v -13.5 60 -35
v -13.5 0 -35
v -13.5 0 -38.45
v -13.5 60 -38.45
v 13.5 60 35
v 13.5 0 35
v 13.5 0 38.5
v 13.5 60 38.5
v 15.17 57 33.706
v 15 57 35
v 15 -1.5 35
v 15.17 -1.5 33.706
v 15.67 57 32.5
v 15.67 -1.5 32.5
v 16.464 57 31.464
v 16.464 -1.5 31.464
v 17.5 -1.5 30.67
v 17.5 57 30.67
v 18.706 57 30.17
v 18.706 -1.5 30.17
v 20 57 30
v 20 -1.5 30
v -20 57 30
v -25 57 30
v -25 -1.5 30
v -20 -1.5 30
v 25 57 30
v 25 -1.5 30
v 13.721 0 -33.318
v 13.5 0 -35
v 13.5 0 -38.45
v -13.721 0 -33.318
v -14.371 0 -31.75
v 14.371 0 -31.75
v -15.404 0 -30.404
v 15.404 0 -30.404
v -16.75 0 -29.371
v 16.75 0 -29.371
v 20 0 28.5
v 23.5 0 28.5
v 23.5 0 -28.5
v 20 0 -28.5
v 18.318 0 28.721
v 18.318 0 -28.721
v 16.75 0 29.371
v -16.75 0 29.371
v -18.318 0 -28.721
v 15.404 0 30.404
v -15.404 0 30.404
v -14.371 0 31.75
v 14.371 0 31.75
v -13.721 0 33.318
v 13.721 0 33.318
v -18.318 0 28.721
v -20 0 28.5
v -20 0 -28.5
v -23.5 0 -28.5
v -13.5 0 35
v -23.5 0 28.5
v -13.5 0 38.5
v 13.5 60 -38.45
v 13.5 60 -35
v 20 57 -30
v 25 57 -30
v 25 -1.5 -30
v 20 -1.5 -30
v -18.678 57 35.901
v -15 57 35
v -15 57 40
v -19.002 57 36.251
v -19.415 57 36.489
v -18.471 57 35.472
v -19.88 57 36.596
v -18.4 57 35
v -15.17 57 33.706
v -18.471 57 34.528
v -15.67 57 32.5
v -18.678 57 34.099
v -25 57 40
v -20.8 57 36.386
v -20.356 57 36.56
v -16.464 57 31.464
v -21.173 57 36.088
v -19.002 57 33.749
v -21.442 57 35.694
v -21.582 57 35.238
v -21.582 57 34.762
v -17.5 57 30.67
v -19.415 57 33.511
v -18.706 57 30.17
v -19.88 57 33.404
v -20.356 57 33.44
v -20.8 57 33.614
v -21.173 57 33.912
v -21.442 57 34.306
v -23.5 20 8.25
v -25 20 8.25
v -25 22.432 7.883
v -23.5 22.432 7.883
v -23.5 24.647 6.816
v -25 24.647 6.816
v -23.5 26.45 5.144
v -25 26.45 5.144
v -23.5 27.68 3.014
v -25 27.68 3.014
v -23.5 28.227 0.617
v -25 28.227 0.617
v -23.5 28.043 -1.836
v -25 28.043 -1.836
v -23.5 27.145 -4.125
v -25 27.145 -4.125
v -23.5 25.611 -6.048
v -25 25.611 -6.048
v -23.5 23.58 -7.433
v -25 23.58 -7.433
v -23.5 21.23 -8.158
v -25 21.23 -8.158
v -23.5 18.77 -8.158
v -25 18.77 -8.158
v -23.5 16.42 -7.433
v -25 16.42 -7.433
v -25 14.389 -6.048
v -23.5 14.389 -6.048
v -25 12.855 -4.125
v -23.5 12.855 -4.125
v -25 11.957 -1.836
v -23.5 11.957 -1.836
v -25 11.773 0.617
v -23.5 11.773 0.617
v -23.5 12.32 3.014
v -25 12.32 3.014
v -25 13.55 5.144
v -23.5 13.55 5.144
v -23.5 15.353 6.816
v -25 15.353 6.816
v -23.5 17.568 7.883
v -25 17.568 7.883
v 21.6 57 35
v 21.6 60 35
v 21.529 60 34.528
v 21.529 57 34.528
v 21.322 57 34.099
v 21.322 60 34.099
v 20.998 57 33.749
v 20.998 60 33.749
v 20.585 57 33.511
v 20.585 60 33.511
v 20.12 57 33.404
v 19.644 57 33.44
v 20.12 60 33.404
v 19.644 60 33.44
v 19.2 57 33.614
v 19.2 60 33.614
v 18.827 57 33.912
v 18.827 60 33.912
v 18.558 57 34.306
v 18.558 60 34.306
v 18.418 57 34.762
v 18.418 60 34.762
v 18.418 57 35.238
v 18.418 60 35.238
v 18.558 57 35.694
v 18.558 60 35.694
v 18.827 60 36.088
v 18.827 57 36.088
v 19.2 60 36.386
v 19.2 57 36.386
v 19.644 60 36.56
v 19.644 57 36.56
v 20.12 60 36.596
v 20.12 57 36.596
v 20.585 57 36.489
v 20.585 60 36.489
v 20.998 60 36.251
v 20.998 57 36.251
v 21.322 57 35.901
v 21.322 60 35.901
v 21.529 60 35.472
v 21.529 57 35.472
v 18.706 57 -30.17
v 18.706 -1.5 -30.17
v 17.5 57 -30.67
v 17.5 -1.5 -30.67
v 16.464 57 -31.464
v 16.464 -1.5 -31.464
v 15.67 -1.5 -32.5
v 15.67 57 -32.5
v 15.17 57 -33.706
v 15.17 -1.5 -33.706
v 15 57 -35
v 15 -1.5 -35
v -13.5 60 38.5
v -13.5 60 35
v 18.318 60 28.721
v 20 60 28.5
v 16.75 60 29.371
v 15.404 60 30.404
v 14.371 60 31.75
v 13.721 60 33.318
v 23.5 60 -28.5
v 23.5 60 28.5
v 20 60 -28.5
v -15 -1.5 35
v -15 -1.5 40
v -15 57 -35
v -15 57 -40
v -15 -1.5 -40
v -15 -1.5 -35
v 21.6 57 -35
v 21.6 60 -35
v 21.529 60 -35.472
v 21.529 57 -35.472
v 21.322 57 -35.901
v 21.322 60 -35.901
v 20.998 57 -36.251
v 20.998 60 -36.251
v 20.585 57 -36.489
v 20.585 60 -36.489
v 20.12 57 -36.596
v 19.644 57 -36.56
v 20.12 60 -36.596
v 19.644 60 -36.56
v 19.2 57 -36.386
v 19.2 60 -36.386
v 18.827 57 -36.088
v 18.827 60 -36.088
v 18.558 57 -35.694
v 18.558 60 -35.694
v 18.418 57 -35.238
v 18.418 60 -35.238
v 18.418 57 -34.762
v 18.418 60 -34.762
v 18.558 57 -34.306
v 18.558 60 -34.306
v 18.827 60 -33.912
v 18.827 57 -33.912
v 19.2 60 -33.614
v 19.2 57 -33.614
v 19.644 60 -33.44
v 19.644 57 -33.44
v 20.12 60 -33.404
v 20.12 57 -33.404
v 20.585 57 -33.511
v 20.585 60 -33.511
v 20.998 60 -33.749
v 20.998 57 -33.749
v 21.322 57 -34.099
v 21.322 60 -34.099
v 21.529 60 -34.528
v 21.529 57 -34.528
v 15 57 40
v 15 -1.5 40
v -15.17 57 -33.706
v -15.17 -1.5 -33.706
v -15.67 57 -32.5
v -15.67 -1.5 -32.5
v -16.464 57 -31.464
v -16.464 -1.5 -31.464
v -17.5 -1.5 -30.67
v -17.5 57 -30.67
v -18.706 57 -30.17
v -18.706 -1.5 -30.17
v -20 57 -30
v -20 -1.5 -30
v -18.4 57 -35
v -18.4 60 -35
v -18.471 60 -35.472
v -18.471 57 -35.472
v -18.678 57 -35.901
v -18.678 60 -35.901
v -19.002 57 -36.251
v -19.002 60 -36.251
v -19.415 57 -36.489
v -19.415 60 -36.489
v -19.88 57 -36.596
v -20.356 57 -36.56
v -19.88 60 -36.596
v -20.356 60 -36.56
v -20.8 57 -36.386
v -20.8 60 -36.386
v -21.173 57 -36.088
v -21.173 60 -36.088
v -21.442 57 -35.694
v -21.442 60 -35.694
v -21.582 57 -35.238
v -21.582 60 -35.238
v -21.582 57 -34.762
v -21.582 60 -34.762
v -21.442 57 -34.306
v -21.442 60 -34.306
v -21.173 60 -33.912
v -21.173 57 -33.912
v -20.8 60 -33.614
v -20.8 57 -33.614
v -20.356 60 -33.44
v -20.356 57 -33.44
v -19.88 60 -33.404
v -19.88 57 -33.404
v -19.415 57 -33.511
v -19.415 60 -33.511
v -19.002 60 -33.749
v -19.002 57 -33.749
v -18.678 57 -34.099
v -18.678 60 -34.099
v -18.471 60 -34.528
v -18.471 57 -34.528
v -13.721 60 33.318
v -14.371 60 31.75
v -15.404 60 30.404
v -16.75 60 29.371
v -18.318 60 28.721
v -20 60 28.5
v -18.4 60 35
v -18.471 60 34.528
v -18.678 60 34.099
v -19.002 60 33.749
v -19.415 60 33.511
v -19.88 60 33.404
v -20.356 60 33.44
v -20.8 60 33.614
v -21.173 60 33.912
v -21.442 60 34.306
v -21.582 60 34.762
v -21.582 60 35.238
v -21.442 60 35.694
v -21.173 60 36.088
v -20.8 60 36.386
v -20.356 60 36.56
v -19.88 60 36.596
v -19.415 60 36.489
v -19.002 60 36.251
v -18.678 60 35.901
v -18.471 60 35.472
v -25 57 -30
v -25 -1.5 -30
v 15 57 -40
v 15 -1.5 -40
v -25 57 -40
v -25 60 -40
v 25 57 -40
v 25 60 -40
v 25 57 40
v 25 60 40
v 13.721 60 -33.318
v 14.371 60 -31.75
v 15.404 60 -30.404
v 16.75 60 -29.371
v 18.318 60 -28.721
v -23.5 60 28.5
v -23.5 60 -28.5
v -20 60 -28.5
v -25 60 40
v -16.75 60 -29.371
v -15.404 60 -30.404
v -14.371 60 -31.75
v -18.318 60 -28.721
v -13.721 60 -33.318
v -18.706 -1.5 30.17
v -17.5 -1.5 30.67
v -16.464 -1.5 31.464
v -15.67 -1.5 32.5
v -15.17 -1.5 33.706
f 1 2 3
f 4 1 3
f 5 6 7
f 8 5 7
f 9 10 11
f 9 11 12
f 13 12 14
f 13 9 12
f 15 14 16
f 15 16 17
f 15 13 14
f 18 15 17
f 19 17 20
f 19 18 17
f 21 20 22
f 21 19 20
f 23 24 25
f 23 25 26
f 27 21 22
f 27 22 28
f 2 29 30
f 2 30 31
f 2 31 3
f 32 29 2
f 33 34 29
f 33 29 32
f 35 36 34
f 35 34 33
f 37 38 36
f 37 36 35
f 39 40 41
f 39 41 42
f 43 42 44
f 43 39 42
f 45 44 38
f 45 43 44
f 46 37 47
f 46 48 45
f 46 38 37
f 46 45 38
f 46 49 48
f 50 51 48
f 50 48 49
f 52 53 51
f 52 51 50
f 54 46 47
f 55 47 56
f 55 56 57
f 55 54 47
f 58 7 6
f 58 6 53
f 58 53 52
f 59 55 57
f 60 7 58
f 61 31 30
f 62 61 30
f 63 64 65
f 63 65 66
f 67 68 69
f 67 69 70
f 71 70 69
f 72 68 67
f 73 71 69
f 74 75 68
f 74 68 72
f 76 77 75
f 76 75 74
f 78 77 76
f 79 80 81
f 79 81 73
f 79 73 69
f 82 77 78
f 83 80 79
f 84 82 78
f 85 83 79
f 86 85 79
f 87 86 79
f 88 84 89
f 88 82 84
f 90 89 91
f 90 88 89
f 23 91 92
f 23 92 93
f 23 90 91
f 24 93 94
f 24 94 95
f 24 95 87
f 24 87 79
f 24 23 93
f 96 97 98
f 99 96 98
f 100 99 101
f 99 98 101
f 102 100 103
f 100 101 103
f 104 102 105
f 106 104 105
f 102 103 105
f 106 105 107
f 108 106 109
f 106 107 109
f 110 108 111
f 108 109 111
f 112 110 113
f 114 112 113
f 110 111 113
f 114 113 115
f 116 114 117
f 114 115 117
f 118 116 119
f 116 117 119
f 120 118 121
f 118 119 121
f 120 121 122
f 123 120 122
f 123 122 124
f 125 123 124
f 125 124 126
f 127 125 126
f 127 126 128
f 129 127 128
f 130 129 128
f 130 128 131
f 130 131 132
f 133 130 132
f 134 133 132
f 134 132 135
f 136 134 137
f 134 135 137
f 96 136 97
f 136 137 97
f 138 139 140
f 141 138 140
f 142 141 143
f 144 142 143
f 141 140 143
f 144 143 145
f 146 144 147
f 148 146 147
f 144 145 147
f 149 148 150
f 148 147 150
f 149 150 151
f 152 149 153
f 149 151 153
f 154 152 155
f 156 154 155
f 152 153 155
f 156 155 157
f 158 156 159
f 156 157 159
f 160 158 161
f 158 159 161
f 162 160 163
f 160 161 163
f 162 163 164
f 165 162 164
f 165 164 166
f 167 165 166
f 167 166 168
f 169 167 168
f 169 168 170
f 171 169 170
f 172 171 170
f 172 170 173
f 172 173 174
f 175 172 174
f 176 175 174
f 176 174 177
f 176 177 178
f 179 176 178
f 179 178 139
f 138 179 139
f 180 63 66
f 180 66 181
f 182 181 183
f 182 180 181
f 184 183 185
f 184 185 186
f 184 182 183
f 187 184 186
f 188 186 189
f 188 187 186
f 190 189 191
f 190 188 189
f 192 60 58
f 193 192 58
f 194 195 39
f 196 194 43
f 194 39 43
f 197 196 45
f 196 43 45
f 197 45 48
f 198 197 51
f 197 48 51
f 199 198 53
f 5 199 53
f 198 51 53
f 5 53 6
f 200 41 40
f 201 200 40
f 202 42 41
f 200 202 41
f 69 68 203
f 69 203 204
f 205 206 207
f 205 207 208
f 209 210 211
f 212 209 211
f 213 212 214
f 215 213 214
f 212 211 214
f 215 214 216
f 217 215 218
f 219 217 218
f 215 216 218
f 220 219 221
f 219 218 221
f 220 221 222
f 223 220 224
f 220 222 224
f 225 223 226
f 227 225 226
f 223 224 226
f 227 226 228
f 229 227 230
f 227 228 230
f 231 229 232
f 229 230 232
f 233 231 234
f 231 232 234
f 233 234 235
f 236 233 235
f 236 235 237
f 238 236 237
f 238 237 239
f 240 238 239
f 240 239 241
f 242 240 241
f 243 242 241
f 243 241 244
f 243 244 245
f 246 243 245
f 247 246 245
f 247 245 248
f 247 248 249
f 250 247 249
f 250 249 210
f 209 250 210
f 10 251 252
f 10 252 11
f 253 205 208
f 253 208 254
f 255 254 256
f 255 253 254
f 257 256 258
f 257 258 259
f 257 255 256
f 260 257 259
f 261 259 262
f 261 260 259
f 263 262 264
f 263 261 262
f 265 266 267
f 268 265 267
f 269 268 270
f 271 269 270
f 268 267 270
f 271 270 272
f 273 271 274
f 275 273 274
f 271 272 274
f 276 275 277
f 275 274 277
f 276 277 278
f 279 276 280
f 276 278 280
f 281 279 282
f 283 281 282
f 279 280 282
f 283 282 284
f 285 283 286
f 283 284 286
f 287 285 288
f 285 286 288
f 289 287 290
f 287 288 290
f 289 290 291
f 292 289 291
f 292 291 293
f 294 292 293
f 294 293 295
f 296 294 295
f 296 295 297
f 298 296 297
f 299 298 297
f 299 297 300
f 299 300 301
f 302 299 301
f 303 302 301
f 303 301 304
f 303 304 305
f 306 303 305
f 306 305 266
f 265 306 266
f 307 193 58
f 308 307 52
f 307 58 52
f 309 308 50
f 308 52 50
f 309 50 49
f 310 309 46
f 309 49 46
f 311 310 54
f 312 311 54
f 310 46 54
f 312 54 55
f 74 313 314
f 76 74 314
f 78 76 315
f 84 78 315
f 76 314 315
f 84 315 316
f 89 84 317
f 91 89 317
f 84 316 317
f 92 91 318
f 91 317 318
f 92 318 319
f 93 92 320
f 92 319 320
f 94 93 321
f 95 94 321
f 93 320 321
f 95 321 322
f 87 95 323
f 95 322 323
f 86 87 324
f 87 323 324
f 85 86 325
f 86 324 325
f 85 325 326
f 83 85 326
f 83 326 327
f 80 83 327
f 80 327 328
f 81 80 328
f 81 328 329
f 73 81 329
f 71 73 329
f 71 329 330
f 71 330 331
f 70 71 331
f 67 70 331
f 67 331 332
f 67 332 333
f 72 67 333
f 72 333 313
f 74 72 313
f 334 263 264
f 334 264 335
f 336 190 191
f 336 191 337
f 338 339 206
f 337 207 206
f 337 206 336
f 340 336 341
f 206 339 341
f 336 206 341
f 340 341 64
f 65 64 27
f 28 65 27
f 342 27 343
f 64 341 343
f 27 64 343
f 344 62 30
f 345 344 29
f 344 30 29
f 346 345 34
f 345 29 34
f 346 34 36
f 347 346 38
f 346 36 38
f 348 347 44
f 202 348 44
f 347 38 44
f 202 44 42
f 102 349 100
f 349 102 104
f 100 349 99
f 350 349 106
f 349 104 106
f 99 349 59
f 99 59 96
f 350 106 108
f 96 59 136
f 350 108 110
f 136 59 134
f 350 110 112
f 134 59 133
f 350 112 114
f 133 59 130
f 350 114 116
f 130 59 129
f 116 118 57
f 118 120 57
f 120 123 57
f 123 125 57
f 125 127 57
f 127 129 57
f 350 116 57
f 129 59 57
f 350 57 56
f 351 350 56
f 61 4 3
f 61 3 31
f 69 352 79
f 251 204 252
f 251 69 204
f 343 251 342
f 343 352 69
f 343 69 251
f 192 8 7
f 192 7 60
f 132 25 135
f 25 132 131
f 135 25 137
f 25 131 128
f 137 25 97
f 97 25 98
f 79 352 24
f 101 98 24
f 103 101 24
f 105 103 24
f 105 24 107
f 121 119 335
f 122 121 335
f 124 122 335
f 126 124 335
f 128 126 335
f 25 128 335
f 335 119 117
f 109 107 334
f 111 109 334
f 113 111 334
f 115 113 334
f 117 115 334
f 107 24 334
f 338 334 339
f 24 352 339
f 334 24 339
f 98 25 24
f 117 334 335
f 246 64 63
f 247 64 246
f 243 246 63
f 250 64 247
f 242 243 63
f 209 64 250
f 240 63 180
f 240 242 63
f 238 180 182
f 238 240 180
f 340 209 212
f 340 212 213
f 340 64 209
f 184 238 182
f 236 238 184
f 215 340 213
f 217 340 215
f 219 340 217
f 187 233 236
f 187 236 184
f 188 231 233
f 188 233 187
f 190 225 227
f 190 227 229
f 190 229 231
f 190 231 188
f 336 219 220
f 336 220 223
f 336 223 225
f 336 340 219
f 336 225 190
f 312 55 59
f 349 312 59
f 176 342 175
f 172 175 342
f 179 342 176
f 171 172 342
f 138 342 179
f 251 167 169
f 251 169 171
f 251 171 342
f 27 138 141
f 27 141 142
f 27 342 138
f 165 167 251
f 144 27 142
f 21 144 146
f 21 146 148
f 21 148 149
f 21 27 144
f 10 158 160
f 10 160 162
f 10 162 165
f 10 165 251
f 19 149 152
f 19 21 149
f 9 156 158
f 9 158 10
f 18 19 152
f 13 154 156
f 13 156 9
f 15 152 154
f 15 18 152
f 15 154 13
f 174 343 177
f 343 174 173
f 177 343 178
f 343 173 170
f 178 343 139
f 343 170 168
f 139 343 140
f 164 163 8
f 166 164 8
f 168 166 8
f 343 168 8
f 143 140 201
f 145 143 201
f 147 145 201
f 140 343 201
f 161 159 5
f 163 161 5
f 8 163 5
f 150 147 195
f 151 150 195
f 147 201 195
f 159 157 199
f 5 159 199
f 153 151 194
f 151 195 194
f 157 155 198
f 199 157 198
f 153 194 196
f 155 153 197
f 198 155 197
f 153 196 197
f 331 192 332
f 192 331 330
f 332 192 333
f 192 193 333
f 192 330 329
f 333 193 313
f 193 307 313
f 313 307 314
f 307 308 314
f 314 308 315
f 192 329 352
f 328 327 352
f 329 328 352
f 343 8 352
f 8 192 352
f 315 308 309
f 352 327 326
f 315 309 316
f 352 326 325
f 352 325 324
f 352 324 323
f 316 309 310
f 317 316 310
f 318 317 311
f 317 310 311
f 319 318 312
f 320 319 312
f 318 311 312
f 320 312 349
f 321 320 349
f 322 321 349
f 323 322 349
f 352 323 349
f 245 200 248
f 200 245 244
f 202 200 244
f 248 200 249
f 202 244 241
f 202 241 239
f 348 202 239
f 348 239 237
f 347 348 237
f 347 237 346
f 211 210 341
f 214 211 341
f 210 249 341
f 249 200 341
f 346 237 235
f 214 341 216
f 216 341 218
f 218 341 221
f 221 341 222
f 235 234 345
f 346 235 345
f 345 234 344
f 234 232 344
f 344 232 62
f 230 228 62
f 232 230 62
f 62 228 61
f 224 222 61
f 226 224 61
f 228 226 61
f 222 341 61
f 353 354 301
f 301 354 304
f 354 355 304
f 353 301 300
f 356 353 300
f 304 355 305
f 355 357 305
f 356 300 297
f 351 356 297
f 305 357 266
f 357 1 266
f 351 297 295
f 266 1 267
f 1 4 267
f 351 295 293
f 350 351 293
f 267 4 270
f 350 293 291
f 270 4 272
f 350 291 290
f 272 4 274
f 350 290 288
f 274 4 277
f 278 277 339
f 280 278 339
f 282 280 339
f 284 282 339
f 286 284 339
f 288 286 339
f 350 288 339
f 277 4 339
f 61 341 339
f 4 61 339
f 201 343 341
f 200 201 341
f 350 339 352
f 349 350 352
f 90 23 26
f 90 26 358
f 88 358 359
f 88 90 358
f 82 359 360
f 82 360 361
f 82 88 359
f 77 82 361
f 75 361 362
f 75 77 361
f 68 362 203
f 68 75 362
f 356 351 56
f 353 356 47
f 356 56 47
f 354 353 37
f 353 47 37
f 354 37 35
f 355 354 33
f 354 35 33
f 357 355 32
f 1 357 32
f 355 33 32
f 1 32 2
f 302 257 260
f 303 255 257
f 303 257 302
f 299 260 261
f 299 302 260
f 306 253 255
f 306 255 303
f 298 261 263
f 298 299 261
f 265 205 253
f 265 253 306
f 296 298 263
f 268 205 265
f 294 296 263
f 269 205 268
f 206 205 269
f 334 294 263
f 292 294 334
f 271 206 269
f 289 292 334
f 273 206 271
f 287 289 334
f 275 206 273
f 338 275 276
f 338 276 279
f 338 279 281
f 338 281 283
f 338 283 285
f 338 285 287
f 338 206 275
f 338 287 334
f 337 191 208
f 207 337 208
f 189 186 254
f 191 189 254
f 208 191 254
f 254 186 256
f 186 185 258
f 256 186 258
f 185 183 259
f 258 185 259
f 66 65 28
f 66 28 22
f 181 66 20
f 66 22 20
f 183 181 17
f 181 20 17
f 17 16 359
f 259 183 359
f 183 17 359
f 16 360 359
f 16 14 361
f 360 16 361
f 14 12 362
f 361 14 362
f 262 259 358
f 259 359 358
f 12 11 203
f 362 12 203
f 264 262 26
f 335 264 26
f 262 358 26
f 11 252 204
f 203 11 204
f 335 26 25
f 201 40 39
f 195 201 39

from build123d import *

# Parameters (mm, degrees)
BOSS_EXTRUDE6_DEPTH = 60
BOSS_EXTRUDE8_DEPTH = 1.5
BOSS_EXTRUDE9_DEPTH = 3
SKETCH15_R          = 1.6
CUT_EXTRUDE4_DEPTH  = 62.5
SKETCH11_R          = 8.25
CUT_EXTRUDE3_DEPTH  = 1.5


with BuildPart() as part:
    # Sketch1 → Boss-Extrude6 (new body)
    with BuildSketch(Plane(origin=(0, 0, 0), x_dir=(1, 0, 0), z_dir=(0, 1, 0))):
        with BuildLine():
            Line((-15, -35), (-15, -40))
            Line((-15, -40), (-13.5, -40))
            Line((-13.5, -40), (13.5, -40))
            Line((13.5, -40), (15, -40))
            Line((15, -40), (15, -35))
            ThreePointArc((15, -35), (16.464466094, -31.464466094), (20, -30))
            Line((20, -30), (25, -30))
            Line((25, -30), (25, -28.5))
            Line((25, -28.5), (25, 28.5))
            Line((25, 28.5), (25, 30))
            Line((25, 30), (20, 30))
            ThreePointArc((20, 30), (16.464466094, 31.464466094), (15, 35))
            Line((15, 35), (15, 40))
            Line((15, 40), (13.5, 40))
            Line((13.5, 40), (-13.5, 40))
            Line((-13.5, 40), (-15, 40))
            Line((-15, 40), (-15, 35))
            ThreePointArc((-15, 35), (-16.464466094, 31.464466094), (-20, 30))
            Line((-20, 30), (-25, 30))
            Line((-25, 30), (-25, 28.5))
            Line((-25, 28.5), (-25, -28.5))
            Line((-25, -28.5), (-25, -30))
            Line((-25, -30), (-20, -30))
            ThreePointArc((-20, -30), (-16.464466094, -31.464466094), (-15, -35))
        make_face()
        with BuildLine():
            Line((20, 28.5), (23.5, 28.5))
            Line((23.5, 28.5), (23.5, -28.5))
            Line((23.5, -28.5), (20, -28.5))
            ThreePointArc((20, -28.5), (15.403805922, -30.403805922), (13.5, -35))
            Line((13.5, -35), (13.5, -38.5))
            Line((13.5, -38.5), (-13.5, -38.5))
            Line((-13.5, -38.5), (-13.5, -35))
            ThreePointArc((-13.5, -35), (-15.403805922, -30.403805922), (-20, -28.5))
            Line((-20, -28.5), (-23.5, -28.5))
            Line((-23.5, -28.5), (-23.5, 28.5))
            Line((-23.5, 28.5), (-20, 28.5))
            ThreePointArc((-20, 28.5), (-15.403805922, 30.403805922), (-13.5, 35))
            Line((-13.5, 35), (-13.5, 38.45))
            Line((-13.5, 38.45), (13.5, 38.45))
            Line((13.5, 38.45), (13.5, 35))
            ThreePointArc((13.5, 35), (15.403805922, 30.403805922), (20, 28.5))
        make_face(mode=Mode.SUBTRACT)
    extrude(amount=BOSS_EXTRUDE6_DEPTH)

    # Sketch7 → Boss-Extrude8 (add)
    with BuildSketch(Plane.XZ):
        with BuildLine():
            Line((-15, 40), (15, 40))
            Line((15, 40), (15, 35))
            ThreePointArc((15, 35), (16.464466094, 31.464466094), (20, 30))
            Line((20, 30), (25, 30))
            Line((25, 30), (25, -30))
            Line((25, -30), (20, -30))
            ThreePointArc((20, -30), (16.464466094, -31.464466094), (15, -35))
            Line((15, -35), (15, -40))
            Line((15, -40), (-15, -40))
            Line((-15, -40), (-15, -35))
            ThreePointArc((-15, -35), (-16.464466094, -31.464466094), (-20, -30))
            Line((-20, -30), (-25, -30))
            Line((-25, -30), (-25, 30))
            Line((-25, 30), (-20, 30))
            ThreePointArc((-20, 30), (-16.464466094, 31.464466094), (-15, 35))
            Line((-15, 35), (-15, 40))
        make_face()
    extrude(amount=BOSS_EXTRUDE8_DEPTH)

    # Sketch12 → Boss-Extrude9 (add)
    with BuildSketch(Plane(origin=(0, 60, 0), x_dir=(1, 0, 0), z_dir=(0, 1, 0))):
        with BuildLine():
            Line((-25, 40), (-15, 40))
            Line((-15, 40), (-15, 35))
            ThreePointArc((-15, 35), (-16.464466094, 31.464466094), (-20, 30))
            Line((-20, 30), (-25, 30))
            Line((-25, 30), (-25, 40))
        make_face()
        with BuildLine():
            Line((15, 40), (25, 40))
            Line((25, 40), (25, 30))
            Line((25, 30), (20, 30))
            ThreePointArc((20, 30), (16.464466094, 31.464466094), (15, 35))
            Line((15, 35), (15, 40))
        make_face()
        with BuildLine():
            Line((20, -30), (25, -30))
            Line((25, -30), (25, -40))
            Line((25, -40), (15, -40))
            Line((15, -40), (15, -35))
            ThreePointArc((15, -35), (16.464466094, -31.464466094), (20, -30))
        make_face()
        with BuildLine():
            Line((-15, -40), (-25, -40))
            Line((-25, -40), (-25, -30))
            Line((-25, -30), (-20, -30))
            ThreePointArc((-20, -30), (-16.464466094, -31.464466094), (-15, -35))
            Line((-15, -35), (-15, -40))
        make_face()
    extrude(amount=-BOSS_EXTRUDE9_DEPTH)

    # Sketch15 → Cut-Extrude4 (cut, through all)
    with BuildSketch(Plane(origin=(0, 60, 0), x_dir=(1, 0, 0), z_dir=(0, 1, 0))):
        with Locations((-20, -35)):
            Circle(SKETCH15_R)
        with Locations((20, -35)):
            Circle(SKETCH15_R)
        with Locations((20, 35)):
            Circle(SKETCH15_R)
        with Locations((-20, 35)):
            Circle(SKETCH15_R)
    extrude(amount=-CUT_EXTRUDE4_DEPTH, mode=Mode.SUBTRACT)

    # Sketch11 → Cut-Extrude3 (cut)
    with BuildSketch(Plane.ZY.offset(25)):
        with Locations((0, 20)):
            Circle(SKETCH11_R)
    extrude(amount=-CUT_EXTRUDE3_DEPTH, mode=Mode.SUBTRACT)


solid = part.part
